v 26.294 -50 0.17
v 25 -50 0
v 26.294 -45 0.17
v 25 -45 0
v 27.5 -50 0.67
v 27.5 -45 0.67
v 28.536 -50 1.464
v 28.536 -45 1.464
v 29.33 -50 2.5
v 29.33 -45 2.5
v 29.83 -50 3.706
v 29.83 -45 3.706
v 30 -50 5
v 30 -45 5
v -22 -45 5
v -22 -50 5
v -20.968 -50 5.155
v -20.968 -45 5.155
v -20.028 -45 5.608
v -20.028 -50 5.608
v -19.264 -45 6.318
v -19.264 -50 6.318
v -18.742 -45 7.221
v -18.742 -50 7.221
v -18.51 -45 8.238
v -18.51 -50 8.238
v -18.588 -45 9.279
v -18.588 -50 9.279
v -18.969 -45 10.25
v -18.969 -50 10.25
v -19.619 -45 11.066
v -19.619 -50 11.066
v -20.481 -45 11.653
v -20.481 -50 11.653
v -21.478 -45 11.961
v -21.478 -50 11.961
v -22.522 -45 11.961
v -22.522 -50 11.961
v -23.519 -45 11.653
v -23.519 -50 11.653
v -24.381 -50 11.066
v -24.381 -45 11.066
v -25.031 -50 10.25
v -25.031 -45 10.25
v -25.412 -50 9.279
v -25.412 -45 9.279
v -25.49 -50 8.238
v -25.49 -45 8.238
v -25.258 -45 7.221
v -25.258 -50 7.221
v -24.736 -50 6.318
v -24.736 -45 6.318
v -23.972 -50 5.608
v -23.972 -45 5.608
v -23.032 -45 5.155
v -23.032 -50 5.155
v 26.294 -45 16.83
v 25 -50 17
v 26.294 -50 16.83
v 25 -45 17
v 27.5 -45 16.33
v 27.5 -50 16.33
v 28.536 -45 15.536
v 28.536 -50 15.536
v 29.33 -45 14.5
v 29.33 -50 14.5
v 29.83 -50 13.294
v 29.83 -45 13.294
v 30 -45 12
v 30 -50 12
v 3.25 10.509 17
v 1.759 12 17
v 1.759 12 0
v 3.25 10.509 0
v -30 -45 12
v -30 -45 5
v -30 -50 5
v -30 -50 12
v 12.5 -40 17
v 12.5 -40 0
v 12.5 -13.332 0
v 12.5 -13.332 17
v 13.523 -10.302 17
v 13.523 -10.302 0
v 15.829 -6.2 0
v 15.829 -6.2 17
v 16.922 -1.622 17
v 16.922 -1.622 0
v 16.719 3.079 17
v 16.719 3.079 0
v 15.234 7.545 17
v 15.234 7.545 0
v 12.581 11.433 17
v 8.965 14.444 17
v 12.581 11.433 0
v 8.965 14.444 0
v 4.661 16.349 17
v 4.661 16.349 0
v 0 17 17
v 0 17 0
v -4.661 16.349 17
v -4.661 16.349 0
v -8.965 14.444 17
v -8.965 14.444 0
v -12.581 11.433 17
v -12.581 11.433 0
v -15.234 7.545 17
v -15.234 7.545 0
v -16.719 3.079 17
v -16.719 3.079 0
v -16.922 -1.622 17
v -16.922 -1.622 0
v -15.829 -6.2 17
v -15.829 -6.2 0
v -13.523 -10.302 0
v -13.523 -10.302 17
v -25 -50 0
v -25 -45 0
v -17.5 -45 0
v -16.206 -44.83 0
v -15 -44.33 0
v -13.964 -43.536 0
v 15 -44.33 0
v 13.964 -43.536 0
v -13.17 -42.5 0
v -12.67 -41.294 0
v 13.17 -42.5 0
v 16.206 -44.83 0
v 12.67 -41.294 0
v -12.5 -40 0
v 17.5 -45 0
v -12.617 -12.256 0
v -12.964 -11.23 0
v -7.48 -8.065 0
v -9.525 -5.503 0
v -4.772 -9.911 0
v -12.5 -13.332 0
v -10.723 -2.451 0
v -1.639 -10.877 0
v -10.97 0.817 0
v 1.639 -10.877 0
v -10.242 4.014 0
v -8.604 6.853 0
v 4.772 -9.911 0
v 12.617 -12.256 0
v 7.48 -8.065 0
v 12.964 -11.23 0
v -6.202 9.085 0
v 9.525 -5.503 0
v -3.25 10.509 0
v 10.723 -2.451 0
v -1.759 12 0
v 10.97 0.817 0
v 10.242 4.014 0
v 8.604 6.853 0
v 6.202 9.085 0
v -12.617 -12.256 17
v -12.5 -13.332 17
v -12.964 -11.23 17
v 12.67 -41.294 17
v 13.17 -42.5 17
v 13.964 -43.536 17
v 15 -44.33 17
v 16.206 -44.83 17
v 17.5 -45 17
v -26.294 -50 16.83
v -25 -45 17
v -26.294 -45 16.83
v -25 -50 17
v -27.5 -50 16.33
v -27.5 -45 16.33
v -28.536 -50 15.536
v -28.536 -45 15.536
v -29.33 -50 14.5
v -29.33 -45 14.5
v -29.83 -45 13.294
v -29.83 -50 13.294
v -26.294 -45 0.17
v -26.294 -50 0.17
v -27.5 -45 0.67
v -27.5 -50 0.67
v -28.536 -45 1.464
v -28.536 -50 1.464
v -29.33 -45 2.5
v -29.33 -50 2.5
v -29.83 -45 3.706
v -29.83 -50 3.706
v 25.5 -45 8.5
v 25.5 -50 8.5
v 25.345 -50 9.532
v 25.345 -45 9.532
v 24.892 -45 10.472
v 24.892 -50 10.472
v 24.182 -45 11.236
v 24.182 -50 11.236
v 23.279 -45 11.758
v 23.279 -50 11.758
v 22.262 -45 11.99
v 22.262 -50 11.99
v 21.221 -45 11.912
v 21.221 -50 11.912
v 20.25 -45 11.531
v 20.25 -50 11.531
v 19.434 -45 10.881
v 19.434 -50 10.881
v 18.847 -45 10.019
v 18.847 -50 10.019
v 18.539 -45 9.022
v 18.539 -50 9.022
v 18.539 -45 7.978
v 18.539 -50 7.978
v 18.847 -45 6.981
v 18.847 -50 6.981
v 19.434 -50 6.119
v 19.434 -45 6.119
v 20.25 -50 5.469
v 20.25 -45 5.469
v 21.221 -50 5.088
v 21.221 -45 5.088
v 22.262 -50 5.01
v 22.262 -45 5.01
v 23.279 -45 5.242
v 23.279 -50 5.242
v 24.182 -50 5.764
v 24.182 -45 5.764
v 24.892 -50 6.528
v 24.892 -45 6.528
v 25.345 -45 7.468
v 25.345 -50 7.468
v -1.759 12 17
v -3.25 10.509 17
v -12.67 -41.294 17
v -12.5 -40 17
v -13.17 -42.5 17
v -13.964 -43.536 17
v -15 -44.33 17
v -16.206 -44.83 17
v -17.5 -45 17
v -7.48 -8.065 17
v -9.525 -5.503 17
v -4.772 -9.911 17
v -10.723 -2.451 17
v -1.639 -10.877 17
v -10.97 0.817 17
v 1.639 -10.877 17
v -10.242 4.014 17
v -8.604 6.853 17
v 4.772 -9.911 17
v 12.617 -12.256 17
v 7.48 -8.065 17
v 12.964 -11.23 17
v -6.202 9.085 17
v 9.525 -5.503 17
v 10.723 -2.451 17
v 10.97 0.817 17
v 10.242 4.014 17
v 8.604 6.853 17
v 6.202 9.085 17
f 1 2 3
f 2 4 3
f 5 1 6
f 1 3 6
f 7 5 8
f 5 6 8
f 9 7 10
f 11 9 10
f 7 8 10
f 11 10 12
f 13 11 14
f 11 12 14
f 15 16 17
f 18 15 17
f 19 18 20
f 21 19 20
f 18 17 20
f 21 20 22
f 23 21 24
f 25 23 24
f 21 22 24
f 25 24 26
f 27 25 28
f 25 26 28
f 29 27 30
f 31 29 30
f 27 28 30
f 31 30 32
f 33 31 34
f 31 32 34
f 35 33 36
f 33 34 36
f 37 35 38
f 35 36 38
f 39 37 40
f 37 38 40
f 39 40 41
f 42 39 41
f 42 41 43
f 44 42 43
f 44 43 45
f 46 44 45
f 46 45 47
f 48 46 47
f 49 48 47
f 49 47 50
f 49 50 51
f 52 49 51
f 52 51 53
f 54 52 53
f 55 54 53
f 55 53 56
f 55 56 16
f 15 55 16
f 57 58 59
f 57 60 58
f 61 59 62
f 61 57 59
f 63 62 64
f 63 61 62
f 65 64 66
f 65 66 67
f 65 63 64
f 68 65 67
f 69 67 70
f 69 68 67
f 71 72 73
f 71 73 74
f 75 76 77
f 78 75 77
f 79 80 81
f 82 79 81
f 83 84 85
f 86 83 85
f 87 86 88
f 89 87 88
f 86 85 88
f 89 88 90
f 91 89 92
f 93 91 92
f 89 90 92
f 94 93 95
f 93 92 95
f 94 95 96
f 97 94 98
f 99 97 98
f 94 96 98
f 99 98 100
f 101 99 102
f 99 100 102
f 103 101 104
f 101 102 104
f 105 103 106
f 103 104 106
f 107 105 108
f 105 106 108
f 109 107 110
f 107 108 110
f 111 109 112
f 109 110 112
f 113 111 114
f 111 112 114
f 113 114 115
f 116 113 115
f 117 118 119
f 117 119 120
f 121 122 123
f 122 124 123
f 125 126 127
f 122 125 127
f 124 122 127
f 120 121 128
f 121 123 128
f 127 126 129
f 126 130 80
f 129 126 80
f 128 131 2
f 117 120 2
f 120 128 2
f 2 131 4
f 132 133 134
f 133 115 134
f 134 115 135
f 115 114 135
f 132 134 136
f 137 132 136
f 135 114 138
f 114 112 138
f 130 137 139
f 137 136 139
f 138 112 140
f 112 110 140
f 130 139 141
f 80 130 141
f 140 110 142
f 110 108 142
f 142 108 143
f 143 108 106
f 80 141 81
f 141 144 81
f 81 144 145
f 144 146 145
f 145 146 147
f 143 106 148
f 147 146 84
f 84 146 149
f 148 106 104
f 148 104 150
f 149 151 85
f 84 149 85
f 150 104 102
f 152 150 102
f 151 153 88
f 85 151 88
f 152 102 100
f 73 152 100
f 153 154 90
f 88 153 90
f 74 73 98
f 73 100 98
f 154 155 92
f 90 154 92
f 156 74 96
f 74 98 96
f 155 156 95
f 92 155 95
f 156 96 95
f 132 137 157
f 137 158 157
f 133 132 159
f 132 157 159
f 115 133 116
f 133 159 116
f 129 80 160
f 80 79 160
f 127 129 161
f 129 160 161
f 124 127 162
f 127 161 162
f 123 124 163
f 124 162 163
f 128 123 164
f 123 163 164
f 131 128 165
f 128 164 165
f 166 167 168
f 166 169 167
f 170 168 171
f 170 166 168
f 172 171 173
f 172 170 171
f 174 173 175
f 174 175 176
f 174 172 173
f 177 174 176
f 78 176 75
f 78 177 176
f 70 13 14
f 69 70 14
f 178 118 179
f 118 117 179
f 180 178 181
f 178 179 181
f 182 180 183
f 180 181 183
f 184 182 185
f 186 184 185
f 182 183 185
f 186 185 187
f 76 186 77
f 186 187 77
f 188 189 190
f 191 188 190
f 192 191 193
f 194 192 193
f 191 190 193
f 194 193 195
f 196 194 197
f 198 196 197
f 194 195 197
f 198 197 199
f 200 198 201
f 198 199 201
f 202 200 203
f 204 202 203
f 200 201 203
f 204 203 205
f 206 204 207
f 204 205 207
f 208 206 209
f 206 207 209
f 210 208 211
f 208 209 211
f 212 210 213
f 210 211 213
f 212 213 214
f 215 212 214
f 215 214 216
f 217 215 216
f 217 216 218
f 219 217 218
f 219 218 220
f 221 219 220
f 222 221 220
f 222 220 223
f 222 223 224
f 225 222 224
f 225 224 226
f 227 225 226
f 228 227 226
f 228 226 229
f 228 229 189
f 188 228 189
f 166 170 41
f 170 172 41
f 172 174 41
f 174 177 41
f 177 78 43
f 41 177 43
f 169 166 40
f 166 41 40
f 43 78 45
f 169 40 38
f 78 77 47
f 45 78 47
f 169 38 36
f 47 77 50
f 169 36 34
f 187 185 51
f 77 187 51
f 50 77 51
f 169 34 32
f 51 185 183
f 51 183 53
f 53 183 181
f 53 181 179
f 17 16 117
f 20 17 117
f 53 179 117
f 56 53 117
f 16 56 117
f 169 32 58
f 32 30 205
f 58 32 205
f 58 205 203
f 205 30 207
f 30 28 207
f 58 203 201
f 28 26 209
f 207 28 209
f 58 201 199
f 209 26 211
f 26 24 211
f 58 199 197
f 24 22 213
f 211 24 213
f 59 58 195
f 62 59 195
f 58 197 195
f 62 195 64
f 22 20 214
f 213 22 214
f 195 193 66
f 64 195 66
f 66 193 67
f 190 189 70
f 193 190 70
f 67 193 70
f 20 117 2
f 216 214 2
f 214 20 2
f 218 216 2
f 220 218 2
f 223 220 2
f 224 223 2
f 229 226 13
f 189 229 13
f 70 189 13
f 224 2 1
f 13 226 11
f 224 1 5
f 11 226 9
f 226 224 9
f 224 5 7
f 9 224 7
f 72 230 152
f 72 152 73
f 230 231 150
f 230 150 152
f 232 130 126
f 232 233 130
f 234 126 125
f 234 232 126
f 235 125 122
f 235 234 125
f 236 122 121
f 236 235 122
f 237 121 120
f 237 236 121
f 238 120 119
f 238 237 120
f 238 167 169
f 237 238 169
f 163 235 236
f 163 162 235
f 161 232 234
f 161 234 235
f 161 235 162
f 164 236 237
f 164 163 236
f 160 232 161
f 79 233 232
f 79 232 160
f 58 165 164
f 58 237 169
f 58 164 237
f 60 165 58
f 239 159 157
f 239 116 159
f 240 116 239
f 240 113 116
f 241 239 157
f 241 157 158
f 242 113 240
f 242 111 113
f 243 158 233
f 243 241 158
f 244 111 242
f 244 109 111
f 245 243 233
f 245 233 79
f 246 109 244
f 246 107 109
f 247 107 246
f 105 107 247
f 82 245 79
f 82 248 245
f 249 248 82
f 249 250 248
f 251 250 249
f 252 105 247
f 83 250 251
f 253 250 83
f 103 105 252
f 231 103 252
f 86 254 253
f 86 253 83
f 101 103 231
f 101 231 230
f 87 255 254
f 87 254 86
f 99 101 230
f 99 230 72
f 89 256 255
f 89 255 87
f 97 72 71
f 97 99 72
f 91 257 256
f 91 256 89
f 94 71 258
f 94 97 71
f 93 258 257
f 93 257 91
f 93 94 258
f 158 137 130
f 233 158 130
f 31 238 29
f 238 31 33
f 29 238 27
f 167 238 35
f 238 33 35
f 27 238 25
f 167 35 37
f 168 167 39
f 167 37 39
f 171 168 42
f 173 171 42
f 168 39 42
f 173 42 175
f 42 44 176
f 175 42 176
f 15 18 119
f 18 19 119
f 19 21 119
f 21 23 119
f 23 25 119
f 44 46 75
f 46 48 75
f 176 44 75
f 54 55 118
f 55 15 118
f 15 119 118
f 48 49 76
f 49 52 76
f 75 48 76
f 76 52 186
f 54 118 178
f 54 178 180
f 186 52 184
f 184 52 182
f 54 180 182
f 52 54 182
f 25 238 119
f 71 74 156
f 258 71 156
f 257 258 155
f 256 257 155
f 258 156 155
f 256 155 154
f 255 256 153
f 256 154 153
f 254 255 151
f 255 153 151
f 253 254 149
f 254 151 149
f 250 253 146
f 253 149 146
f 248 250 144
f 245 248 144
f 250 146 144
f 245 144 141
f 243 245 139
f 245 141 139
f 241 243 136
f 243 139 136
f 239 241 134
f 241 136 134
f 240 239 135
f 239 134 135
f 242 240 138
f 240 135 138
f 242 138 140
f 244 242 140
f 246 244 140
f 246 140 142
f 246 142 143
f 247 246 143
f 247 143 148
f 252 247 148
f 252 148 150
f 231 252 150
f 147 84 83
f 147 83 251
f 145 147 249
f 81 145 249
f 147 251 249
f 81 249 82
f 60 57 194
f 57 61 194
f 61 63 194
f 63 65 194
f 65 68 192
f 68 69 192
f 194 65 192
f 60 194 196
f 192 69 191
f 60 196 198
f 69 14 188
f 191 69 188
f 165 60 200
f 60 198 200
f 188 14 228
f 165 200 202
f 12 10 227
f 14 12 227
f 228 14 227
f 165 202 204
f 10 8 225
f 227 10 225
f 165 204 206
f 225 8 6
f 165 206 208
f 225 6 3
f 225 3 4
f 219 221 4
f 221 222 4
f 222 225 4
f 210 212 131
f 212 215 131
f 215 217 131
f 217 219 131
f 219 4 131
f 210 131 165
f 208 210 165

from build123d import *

# Parameters (mm, degrees)
BOSS_EXTRUDE1_DEPTH = 17
CUT_EXTRUDE1_REACH  = 77.353
SKETCH2_R           = 3.5
FILLET1_R           = 5


with BuildPart() as part:
    # Sketch1 → Boss-Extrude1 (new body)
    with BuildSketch(Plane.XY):
        with BuildLine():
            Line((-12.5, -11.521718622), (-12.5, -45))
            Line((-12.5, -45), (-30, -45))
            Line((-30, -45), (-30, -50))
            Line((-30, -50), (30, -50))
            Line((30, -50), (30, -45))
            Line((30, -45), (12.5, -45))
            Line((12.5, -45), (12.5, -11.521718622))
            ThreePointArc((12.5, -11.521718622), (0, 17), (-12.5, -11.521718622))
        make_face()
        with BuildLine():
            Line((-3.25, 10.508924778), (-1.758924778, 12))
            Line((-1.758924778, 12), (1.758924778, 12))
            Line((1.758924778, 12), (3.25, 10.508924778))
            ThreePointArc((3.25, 10.508924778), (0, -11), (-3.25, 10.508924778))
        make_face(mode=Mode.SUBTRACT)
    extrude(amount=BOSS_EXTRUDE1_DEPTH)

    # Sketch2 → Cut-Extrude1 (cut, up to next)
    with BuildSketch(Plane.XZ.offset(50), mode=Mode.PRIVATE) as cut_extrude1_sk1:
        with Locations(Location((-22, 8.5, 0), (0, 0, 270))):
            Circle(SKETCH2_R)
    cut_extrude1_tool1 = extrude(cut_extrude1_sk1.sketch, amount=-CUT_EXTRUDE1_REACH, mode=Mode.PRIVATE) & part.part
    # Sketch2 → Cut-Extrude1 (cut, up to next)
    with BuildSketch(Plane.XZ.offset(50), mode=Mode.PRIVATE) as cut_extrude1_sk2:
        with Locations((22, 8.5)):
            Circle(SKETCH2_R)
    cut_extrude1_tool2 = extrude(cut_extrude1_sk2.sketch, amount=-CUT_EXTRUDE1_REACH, mode=Mode.PRIVATE) & part.part
    add(cut_extrude1_tool1.solids().sort_by_distance((-22, -50, 8.5))[0], mode=Mode.SUBTRACT)
    add(cut_extrude1_tool2.solids().sort_by_distance((22, -50, 8.5))[0], mode=Mode.SUBTRACT)

    # Fillet1
    fillet1_edges = [part.edges().sort_by_distance(p)[0] for p in [
        (-12.5, -45, 8.5),
        (-12.5, -11.521718622, 8.5),
        (12.5, -11.521718622, 8.5),
        (12.5, -45, 8.5),
        (-30, -47.5, 17),
        (30, -47.5, 17),
        (30, -47.5, 0),
        (-30, -47.5, 0),
    ]]
    fillet(fillet1_edges, radius=FILLET1_R)


solid = part.part
